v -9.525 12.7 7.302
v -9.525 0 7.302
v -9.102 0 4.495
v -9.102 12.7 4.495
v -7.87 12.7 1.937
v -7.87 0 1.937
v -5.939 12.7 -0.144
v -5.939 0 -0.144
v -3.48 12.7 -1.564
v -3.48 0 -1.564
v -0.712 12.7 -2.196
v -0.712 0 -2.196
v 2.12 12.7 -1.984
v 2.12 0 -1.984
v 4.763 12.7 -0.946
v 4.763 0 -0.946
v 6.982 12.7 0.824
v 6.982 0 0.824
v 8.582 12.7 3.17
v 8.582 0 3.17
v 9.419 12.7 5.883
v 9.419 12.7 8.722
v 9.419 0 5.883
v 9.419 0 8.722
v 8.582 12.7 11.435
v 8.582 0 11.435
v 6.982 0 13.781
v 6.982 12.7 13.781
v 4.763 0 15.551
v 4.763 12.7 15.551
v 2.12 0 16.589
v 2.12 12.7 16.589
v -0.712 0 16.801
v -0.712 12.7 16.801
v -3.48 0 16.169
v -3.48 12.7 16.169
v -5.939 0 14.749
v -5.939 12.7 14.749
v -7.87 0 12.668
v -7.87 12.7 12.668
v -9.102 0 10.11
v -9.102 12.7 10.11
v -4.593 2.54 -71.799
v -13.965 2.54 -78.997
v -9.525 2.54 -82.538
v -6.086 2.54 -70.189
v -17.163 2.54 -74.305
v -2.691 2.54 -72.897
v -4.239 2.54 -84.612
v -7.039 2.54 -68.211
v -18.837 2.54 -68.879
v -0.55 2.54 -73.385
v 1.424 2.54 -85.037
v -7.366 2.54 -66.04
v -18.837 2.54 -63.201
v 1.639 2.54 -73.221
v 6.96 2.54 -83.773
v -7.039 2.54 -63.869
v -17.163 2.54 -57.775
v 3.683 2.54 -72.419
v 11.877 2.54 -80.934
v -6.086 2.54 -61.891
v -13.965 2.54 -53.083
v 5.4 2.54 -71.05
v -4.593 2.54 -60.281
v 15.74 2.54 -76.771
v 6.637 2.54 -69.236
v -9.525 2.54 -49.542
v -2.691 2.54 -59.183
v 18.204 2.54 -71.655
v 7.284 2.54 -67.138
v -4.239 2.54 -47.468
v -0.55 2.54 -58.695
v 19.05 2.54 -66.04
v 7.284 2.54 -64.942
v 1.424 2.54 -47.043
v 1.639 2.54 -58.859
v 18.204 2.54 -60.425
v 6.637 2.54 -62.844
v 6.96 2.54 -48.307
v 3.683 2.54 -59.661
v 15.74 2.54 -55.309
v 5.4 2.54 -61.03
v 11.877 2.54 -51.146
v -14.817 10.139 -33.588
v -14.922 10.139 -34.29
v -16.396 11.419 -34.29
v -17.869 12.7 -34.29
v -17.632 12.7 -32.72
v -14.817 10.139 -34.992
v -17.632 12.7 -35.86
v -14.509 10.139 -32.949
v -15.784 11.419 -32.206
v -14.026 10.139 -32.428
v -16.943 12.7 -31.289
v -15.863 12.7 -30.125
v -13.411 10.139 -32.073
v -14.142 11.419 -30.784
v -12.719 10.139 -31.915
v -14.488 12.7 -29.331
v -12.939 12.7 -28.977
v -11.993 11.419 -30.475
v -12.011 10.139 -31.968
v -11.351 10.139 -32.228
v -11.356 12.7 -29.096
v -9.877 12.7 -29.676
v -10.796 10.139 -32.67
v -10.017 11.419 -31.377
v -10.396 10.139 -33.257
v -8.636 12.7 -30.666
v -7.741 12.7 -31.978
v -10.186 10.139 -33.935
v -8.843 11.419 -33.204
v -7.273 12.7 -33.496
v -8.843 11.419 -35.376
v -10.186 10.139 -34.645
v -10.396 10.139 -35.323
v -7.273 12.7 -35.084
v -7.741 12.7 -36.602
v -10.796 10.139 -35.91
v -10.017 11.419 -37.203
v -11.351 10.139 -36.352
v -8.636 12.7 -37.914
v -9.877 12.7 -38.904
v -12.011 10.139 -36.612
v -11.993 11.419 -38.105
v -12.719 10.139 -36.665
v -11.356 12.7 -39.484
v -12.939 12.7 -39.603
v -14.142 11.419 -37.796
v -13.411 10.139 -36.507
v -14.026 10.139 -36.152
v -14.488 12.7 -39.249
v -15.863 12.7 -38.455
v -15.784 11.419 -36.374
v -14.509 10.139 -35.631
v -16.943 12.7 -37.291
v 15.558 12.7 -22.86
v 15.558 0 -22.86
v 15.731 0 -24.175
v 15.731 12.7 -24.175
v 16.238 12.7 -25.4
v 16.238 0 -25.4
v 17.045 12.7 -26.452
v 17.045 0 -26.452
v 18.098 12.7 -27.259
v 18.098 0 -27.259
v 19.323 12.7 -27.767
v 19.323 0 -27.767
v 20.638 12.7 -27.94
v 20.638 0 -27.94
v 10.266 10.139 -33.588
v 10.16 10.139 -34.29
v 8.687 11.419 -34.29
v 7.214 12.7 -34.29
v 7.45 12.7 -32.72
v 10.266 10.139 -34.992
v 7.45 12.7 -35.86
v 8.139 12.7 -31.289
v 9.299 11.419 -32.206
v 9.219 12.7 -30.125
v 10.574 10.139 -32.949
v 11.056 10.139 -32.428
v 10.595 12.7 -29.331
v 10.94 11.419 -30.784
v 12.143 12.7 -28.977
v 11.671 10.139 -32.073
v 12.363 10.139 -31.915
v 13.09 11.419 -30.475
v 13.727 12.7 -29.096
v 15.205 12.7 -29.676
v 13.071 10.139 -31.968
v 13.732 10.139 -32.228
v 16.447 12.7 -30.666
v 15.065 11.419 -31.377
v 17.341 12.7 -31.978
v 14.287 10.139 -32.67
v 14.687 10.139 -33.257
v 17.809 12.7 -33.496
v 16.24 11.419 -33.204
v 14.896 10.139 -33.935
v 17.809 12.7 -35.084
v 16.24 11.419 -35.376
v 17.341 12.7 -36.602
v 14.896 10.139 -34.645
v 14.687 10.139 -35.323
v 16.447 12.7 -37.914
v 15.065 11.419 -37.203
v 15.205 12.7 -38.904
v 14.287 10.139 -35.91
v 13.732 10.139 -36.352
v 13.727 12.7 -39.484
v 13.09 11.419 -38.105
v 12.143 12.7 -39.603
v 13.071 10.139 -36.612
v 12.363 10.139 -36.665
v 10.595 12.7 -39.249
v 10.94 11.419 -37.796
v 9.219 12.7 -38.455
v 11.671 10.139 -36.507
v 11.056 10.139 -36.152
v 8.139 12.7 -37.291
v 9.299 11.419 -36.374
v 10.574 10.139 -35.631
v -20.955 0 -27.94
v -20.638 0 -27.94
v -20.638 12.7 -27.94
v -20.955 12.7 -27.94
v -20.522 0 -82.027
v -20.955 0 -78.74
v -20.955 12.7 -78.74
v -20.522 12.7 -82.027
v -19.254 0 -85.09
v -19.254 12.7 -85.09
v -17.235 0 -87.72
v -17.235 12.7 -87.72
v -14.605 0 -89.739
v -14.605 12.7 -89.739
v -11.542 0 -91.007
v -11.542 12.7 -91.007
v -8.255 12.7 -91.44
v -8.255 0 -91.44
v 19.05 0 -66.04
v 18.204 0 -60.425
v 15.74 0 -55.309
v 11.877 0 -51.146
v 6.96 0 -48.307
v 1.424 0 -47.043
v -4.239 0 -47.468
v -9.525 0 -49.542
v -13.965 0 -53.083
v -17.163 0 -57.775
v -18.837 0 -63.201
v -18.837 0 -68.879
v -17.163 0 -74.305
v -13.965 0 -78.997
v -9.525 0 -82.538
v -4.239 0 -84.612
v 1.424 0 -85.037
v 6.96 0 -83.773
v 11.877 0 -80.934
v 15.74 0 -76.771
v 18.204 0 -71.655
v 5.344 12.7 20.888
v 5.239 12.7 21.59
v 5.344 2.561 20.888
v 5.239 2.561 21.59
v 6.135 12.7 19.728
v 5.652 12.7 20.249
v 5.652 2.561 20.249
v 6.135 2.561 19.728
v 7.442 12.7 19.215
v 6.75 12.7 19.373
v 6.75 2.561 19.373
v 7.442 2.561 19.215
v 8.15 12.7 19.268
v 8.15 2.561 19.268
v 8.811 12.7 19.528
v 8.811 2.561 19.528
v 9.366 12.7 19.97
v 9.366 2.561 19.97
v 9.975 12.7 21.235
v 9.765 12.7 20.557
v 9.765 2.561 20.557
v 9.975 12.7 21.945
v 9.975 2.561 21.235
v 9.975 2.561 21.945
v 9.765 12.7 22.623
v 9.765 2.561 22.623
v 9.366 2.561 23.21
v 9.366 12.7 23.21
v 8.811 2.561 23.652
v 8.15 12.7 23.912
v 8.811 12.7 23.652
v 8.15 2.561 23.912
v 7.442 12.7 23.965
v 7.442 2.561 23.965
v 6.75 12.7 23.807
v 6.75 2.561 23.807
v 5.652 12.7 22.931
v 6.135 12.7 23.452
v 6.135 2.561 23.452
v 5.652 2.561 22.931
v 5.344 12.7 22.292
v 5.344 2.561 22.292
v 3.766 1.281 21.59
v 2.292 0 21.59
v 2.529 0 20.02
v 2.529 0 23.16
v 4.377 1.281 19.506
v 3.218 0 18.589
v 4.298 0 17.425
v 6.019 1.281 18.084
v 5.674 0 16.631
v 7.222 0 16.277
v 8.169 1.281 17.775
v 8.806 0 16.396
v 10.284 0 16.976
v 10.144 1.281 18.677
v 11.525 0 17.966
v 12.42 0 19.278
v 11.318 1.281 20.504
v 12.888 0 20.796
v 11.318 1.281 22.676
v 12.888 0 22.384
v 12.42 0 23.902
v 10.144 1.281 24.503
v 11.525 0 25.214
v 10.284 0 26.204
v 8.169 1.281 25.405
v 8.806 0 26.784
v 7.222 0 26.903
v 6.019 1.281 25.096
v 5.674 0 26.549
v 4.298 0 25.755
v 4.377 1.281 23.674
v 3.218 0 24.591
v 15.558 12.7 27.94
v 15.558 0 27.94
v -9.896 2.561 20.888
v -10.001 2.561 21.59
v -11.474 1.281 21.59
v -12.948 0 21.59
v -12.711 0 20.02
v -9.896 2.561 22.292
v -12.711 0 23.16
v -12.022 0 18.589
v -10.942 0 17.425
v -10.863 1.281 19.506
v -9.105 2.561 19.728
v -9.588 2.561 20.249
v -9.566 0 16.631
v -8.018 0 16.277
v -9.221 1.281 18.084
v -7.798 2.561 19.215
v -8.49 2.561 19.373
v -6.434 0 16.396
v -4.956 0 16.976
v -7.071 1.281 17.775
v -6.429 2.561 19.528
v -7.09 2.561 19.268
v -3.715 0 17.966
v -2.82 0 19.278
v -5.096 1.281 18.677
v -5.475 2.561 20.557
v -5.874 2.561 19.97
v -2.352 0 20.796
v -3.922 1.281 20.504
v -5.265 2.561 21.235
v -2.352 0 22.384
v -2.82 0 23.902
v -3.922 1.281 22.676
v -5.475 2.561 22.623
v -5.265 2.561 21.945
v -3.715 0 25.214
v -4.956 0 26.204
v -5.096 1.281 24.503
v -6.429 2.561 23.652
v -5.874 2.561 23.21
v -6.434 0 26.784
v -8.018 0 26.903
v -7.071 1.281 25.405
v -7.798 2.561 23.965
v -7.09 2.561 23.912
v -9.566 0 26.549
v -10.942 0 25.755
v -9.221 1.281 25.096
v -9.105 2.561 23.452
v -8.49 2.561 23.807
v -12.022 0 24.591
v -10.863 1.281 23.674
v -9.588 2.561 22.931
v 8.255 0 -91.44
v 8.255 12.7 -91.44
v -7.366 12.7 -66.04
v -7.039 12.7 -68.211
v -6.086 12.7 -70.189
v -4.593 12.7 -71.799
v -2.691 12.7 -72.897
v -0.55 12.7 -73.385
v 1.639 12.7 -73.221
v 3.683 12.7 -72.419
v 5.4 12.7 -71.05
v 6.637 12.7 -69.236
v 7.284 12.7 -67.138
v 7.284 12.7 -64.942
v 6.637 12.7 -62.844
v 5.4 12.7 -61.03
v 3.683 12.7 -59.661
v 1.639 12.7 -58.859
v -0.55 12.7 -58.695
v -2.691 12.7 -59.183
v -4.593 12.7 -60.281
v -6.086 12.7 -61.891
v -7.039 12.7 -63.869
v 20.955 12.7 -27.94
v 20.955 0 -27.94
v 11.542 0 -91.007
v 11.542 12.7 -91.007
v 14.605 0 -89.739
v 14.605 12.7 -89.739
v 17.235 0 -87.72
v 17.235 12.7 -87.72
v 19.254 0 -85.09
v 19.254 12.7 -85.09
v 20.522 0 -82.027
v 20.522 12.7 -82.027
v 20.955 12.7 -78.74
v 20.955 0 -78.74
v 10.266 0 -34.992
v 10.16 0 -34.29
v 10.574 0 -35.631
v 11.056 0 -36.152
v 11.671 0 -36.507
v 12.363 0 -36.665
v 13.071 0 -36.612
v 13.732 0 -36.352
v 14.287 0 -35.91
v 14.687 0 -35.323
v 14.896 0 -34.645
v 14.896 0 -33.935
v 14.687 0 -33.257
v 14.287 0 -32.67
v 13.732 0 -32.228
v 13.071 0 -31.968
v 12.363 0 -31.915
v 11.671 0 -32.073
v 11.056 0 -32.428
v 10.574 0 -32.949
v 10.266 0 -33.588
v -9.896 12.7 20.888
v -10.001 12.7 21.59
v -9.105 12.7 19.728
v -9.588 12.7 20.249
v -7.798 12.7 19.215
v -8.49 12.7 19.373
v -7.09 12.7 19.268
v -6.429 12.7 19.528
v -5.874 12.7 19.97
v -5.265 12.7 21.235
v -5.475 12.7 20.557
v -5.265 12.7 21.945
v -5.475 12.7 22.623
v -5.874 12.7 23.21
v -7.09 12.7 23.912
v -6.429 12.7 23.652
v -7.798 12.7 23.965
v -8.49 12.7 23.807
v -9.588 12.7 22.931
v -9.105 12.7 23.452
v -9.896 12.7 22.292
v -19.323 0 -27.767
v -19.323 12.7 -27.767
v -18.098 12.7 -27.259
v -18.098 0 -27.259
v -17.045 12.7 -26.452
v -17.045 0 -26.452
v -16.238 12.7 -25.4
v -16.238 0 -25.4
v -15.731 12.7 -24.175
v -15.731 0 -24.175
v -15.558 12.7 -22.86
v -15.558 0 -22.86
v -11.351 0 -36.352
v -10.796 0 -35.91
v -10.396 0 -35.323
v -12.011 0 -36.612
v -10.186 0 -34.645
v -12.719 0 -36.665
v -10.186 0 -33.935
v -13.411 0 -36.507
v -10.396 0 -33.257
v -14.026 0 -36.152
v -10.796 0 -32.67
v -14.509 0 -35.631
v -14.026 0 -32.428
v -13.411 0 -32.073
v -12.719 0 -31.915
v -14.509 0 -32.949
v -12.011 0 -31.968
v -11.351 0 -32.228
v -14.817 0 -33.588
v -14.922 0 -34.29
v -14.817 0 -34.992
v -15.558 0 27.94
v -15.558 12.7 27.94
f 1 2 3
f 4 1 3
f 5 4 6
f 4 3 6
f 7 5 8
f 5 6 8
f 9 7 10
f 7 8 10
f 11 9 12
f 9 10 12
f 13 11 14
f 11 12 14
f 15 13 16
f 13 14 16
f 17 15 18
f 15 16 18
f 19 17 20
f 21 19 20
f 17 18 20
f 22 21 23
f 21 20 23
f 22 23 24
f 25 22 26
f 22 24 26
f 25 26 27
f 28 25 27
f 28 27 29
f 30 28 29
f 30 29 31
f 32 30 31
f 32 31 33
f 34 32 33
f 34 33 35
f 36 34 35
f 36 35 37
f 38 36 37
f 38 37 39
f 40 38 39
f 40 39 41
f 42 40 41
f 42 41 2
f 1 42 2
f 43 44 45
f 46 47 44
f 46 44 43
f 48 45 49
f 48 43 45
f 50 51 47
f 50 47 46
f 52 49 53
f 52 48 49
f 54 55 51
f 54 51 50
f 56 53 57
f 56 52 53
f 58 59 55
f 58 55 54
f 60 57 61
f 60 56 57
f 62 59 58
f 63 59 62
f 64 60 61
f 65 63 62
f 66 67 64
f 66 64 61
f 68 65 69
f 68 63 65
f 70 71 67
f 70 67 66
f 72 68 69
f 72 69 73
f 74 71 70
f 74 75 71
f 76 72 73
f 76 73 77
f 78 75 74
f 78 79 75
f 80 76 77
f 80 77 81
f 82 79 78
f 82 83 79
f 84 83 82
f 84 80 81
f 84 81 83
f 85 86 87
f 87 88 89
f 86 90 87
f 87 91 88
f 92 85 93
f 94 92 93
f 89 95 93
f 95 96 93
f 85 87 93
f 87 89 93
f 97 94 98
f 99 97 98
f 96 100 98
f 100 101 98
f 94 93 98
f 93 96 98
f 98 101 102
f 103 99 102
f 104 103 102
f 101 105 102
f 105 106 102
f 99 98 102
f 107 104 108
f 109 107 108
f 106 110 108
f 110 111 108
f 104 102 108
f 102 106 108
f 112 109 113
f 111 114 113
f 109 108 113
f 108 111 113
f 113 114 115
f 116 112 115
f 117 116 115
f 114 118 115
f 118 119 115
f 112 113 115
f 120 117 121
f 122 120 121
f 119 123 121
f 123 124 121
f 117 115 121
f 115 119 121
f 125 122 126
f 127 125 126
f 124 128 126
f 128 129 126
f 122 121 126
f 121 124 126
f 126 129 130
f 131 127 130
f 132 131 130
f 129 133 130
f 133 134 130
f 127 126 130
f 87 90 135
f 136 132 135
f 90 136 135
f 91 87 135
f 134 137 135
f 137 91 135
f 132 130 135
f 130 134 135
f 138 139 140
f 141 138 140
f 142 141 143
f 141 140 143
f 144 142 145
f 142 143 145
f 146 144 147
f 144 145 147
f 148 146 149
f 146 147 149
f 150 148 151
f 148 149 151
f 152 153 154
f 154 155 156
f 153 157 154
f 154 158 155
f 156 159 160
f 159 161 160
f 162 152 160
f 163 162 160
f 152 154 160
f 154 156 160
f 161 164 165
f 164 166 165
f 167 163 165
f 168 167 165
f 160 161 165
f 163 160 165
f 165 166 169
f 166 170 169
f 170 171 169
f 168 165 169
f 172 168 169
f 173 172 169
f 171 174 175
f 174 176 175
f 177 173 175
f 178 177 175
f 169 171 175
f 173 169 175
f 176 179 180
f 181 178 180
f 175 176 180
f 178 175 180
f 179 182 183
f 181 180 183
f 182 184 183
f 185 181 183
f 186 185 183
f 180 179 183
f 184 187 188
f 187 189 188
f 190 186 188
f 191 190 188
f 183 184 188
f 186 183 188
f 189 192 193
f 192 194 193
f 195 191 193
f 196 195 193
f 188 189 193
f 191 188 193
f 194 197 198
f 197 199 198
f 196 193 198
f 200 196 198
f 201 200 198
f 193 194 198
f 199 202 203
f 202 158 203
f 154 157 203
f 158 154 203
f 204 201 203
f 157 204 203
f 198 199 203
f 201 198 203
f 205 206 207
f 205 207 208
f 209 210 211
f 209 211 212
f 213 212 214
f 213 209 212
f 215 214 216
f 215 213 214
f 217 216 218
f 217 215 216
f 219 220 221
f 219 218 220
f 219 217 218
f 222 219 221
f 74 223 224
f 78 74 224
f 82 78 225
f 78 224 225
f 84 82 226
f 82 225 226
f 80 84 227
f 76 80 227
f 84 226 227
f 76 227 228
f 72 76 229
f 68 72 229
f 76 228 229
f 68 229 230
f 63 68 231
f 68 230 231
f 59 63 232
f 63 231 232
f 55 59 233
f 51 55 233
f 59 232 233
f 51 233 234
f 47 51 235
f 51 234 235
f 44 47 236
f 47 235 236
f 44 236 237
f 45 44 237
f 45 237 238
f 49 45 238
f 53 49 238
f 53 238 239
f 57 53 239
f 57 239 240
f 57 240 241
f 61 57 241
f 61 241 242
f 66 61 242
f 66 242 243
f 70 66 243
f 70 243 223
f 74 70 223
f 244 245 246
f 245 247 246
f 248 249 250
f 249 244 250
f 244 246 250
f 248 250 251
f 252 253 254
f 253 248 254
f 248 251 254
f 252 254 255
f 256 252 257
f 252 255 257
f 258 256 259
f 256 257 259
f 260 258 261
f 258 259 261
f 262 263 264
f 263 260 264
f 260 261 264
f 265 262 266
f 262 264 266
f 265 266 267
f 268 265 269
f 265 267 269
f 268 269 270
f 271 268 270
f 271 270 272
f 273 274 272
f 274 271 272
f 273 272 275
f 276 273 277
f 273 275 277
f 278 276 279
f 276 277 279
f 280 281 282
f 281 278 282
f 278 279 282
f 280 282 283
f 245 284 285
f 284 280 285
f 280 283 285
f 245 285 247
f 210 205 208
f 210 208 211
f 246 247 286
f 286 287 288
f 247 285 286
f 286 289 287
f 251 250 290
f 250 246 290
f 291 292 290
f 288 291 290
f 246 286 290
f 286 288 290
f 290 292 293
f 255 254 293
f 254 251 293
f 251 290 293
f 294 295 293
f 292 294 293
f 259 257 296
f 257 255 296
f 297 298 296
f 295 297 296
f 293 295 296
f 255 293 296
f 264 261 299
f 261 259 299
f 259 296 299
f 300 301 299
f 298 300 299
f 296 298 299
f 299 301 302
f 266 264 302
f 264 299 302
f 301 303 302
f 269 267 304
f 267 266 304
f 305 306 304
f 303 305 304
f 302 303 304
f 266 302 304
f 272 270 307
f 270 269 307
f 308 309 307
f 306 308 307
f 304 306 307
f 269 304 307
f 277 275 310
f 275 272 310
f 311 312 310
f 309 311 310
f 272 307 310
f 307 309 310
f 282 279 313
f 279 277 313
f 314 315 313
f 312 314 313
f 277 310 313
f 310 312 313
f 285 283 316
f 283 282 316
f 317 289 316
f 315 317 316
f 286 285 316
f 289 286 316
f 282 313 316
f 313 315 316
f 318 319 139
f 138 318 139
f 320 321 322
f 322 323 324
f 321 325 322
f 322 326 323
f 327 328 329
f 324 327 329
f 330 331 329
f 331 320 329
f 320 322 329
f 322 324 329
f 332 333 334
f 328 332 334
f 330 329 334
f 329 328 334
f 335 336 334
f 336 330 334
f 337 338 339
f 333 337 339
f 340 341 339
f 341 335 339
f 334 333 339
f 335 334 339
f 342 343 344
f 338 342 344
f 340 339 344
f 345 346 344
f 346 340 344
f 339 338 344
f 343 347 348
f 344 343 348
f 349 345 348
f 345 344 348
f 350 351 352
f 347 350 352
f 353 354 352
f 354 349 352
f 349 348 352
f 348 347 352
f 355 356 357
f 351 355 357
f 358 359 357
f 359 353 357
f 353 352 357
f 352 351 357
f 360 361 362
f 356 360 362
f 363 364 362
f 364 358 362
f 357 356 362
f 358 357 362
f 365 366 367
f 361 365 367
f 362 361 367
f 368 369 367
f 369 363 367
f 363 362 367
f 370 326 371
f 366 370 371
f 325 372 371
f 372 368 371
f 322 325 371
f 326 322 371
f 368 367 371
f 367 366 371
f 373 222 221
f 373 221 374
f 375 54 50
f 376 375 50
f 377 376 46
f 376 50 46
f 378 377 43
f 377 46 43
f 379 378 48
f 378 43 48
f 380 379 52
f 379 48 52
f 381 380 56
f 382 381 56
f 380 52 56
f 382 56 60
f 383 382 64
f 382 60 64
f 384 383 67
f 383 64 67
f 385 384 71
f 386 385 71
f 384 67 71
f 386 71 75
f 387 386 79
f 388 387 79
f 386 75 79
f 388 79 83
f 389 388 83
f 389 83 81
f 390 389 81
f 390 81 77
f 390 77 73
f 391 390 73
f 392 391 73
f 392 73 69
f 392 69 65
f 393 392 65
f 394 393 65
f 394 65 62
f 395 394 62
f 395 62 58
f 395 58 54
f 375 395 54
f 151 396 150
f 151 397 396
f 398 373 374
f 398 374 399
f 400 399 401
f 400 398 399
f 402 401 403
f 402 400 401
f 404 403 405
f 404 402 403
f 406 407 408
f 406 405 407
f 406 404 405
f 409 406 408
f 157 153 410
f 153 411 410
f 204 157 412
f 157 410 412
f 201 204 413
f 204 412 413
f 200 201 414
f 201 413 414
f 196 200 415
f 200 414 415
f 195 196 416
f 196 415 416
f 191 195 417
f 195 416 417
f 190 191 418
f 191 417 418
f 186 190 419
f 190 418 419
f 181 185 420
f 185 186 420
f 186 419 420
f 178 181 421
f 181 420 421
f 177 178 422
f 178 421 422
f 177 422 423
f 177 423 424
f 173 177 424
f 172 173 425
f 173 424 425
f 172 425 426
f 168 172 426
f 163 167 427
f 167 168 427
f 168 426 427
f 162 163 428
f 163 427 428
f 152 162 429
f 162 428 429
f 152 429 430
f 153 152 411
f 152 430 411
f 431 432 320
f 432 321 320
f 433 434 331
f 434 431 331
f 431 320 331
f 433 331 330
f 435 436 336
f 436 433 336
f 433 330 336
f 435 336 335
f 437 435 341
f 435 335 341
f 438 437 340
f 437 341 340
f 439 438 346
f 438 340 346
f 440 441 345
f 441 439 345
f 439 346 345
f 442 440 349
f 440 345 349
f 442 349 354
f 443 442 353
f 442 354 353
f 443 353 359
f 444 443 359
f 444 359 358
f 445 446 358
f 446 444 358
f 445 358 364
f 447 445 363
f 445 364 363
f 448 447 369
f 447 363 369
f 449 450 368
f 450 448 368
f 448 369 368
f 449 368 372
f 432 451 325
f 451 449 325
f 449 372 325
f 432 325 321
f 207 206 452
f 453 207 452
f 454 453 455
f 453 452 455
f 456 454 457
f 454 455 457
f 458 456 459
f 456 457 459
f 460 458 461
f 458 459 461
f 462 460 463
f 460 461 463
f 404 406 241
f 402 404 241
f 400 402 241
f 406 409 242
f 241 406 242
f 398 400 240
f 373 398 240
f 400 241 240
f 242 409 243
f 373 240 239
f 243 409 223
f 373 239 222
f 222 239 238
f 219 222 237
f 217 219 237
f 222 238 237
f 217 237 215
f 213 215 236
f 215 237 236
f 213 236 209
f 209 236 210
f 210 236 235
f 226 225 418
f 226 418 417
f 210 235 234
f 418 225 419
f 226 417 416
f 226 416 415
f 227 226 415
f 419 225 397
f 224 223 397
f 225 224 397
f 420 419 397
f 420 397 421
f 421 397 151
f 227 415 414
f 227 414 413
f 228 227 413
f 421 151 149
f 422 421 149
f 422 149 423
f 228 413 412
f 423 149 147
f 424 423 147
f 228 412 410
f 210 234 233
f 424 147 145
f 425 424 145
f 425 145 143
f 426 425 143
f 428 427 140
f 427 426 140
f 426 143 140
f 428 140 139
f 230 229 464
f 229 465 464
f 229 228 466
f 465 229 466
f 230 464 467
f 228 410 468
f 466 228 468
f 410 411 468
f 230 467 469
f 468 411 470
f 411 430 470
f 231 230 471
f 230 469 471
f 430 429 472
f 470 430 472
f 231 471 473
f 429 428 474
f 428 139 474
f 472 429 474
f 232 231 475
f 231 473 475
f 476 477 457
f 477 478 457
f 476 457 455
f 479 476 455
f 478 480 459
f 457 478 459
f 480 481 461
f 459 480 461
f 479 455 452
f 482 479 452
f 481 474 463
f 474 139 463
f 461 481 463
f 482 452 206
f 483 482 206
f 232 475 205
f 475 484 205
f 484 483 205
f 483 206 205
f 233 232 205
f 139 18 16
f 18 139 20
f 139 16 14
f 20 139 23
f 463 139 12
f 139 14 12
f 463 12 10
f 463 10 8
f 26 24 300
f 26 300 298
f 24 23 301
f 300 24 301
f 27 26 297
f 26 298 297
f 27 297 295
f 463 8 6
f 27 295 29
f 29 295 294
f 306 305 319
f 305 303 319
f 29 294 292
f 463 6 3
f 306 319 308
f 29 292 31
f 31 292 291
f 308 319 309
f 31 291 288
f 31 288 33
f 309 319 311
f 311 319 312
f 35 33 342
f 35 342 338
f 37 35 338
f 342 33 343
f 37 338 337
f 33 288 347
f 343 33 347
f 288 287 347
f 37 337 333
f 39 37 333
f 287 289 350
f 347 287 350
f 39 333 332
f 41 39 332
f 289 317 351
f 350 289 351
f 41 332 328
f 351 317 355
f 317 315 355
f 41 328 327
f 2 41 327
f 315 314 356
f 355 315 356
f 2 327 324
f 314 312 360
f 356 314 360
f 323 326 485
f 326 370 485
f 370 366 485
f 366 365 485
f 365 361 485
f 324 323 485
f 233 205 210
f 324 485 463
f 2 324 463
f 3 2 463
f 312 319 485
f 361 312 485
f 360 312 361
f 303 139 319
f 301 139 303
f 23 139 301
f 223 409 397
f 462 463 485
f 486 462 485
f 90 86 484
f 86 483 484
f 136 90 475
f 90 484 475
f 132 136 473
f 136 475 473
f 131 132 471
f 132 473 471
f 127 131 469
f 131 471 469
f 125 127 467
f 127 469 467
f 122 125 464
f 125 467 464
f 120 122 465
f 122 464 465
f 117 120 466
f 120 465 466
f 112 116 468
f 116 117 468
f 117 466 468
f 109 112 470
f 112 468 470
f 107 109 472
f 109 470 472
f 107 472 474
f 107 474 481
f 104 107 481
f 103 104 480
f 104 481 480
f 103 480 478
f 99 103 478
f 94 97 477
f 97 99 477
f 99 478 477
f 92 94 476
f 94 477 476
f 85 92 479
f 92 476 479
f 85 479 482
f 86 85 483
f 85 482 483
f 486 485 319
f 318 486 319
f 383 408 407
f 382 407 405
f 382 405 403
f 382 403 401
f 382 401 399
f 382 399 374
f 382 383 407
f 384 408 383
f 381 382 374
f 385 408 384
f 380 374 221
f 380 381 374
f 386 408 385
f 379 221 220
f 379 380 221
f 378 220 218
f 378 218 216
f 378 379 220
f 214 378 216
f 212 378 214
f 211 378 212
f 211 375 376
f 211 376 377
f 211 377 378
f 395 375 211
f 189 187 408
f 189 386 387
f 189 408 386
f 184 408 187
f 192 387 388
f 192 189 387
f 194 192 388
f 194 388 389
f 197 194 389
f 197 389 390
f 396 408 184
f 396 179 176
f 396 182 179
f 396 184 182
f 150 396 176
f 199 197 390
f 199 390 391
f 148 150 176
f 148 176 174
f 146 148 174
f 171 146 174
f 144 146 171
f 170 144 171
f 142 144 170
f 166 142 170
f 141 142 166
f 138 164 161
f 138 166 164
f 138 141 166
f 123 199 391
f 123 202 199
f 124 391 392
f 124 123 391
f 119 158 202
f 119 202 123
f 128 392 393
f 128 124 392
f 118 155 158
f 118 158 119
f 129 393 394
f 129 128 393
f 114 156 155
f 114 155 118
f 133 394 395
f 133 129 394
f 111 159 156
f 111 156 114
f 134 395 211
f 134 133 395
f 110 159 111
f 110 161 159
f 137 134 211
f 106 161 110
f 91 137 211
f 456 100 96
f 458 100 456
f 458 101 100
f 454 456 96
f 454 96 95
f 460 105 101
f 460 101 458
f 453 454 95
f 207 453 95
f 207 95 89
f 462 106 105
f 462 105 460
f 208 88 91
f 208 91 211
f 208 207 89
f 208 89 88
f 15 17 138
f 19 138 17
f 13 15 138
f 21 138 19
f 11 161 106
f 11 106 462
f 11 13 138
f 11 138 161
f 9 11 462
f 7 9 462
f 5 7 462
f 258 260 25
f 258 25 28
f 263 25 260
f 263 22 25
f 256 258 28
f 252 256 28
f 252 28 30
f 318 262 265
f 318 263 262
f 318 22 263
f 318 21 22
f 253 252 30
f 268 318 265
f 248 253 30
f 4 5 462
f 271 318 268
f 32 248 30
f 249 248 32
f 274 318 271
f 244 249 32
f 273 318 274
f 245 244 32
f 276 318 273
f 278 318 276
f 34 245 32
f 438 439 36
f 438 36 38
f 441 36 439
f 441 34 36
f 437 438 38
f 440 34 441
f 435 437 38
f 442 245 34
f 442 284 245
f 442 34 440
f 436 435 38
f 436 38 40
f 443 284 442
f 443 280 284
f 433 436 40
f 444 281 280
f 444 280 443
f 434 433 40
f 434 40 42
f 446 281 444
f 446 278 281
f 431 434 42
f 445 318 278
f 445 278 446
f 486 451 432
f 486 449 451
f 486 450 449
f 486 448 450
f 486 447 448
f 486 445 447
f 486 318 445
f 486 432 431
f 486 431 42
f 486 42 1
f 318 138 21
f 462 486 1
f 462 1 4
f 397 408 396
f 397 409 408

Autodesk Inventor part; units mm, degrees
ref_plane "YZ Plane" through (0, 0, 0) normal (1, 0, 0) x (0, 1, 0)
ref_plane "XZ Plane" through (0, 0, 0) normal (0, 1, 0) x (-1, 0, 0)
ref_plane "XY Plane" through (0, 0, 0) normal (0, 0, 1) x (1, 0, 0)
sketch "Sketch1" plane through (0, 0, 0) normal (0, 1, 0) x (-1, 0, 0)
  line L0 (15.5575, -22.86) -> (15.5575, 27.94)
  line L1 (15.5575, 27.94) -> (-15.5575, 27.94)
  line L2 (-15.5575, 27.94) -> (-15.5575, -22.86)
  line L3 (-15.5575, -27.94) -> (15.5575, 27.94) construction
  line L4 (15.5575, -27.94) -> (-15.5575, 27.94) construction
  line L5 (20.6375, -27.94) -> (20.955, -27.94)
  line L6 (20.955, -27.94) -> (20.955, -78.74)
  line L7 (8.255, -91.44) -> (-8.255, -91.44)
  line L8 (-20.955, -78.74) -> (-20.955, -27.94)
  line L9 (-20.955, -27.94) -> (-20.6375, -27.94)
  arc A0 (15.5575, -22.86) -> (20.6375, -27.94) centre (20.6375, -22.86) ccw
  arc A1 (-20.6375, -27.94) -> (-15.5575, -22.86) centre (-20.6375, -22.86) ccw
  circle A2 centre (0, 7.3025) radius 9.525
  arc A3 (8.255, -91.44) -> (20.955, -78.74) centre (8.255, -78.74) ccw
  arc A4 (-20.955, -78.74) -> (-8.255, -91.44) centre (-8.255, -78.74) ccw
  circle A5 centre (0, -66.04) radius 7.366
  line L10 (0, 46.0525) -> (0, -103.086)
  circle A6 centre (7.62, 21.59) radius 2.3813
  circle A7 centre (-7.62, 21.59) radius 2.3813
  circle A8 centre (12.5412, -34.29) radius 2.3813
  circle A9 centre (-12.5412, -34.29) radius 2.3813
  point P0 (0, 0)
  point P1 (20.955, -91.44)
  point P2 (-20.955, -91.44)
  point P3 (0, 0)
  dimension "d0" = 5.08
  dimension "d1" = 31.115
  dimension "d2" = 41.91
  dimension "d3" = 63.5
  dimension "d4" = 119.38
  dimension "d5" = 19.05
  dimension "d6" = 20.6375
  dimension "d7" = 12.7
  dimension "d27" = 25.4
  dimension "d28" = 14.732
  dimension "d29" = 4.7625
  dimension "d30" = 15.24
  dimension "d31" = 6.35
  dimension "d32" = 25.0825
  dimension "d33" = 4.7625
  dimension "d34" = 57.15
extrude "Extrusion1" add sketch "Sketch1" along normal blind 12.7 contours A0 L5 L6 A3 L7 L10 A5 A2 L1 L0 | L10 A2 A5 L7 A4 L8 L9 A1 L2 L1
sketch "Sketch4" plane through (0, 0, 0) normal (0, -1, 0) x (1, 0, 0)
  circle A0 centre (0, -66.04) radius 7.366 projected
  circle A1 centre (0, -66.04) radius 19.05
  point P0 (0, 0)
  dimension "d38" = 38.1
extrude "Extrusion3" cut sketch "Sketch4" against normal blind 2.54
chamfer "Chamfer1" distance 2.9464 angle 41 2 edges at (10.0013, 0, 21.59) (-5.2387, 0, 21.59) measured on face at (-0.3827, 0, -15.9577)
chamfer "Chamfer2" distance 2.9464 angle 41 2 edges at (-10.16, 12.7, -34.29) (14.9225, 12.7, -34.29) measured on face at (-0.3827, 12.7, -15.9577)
equation "\"d33\" = d29"
properties part number "Fixture_Airpot_Support"
